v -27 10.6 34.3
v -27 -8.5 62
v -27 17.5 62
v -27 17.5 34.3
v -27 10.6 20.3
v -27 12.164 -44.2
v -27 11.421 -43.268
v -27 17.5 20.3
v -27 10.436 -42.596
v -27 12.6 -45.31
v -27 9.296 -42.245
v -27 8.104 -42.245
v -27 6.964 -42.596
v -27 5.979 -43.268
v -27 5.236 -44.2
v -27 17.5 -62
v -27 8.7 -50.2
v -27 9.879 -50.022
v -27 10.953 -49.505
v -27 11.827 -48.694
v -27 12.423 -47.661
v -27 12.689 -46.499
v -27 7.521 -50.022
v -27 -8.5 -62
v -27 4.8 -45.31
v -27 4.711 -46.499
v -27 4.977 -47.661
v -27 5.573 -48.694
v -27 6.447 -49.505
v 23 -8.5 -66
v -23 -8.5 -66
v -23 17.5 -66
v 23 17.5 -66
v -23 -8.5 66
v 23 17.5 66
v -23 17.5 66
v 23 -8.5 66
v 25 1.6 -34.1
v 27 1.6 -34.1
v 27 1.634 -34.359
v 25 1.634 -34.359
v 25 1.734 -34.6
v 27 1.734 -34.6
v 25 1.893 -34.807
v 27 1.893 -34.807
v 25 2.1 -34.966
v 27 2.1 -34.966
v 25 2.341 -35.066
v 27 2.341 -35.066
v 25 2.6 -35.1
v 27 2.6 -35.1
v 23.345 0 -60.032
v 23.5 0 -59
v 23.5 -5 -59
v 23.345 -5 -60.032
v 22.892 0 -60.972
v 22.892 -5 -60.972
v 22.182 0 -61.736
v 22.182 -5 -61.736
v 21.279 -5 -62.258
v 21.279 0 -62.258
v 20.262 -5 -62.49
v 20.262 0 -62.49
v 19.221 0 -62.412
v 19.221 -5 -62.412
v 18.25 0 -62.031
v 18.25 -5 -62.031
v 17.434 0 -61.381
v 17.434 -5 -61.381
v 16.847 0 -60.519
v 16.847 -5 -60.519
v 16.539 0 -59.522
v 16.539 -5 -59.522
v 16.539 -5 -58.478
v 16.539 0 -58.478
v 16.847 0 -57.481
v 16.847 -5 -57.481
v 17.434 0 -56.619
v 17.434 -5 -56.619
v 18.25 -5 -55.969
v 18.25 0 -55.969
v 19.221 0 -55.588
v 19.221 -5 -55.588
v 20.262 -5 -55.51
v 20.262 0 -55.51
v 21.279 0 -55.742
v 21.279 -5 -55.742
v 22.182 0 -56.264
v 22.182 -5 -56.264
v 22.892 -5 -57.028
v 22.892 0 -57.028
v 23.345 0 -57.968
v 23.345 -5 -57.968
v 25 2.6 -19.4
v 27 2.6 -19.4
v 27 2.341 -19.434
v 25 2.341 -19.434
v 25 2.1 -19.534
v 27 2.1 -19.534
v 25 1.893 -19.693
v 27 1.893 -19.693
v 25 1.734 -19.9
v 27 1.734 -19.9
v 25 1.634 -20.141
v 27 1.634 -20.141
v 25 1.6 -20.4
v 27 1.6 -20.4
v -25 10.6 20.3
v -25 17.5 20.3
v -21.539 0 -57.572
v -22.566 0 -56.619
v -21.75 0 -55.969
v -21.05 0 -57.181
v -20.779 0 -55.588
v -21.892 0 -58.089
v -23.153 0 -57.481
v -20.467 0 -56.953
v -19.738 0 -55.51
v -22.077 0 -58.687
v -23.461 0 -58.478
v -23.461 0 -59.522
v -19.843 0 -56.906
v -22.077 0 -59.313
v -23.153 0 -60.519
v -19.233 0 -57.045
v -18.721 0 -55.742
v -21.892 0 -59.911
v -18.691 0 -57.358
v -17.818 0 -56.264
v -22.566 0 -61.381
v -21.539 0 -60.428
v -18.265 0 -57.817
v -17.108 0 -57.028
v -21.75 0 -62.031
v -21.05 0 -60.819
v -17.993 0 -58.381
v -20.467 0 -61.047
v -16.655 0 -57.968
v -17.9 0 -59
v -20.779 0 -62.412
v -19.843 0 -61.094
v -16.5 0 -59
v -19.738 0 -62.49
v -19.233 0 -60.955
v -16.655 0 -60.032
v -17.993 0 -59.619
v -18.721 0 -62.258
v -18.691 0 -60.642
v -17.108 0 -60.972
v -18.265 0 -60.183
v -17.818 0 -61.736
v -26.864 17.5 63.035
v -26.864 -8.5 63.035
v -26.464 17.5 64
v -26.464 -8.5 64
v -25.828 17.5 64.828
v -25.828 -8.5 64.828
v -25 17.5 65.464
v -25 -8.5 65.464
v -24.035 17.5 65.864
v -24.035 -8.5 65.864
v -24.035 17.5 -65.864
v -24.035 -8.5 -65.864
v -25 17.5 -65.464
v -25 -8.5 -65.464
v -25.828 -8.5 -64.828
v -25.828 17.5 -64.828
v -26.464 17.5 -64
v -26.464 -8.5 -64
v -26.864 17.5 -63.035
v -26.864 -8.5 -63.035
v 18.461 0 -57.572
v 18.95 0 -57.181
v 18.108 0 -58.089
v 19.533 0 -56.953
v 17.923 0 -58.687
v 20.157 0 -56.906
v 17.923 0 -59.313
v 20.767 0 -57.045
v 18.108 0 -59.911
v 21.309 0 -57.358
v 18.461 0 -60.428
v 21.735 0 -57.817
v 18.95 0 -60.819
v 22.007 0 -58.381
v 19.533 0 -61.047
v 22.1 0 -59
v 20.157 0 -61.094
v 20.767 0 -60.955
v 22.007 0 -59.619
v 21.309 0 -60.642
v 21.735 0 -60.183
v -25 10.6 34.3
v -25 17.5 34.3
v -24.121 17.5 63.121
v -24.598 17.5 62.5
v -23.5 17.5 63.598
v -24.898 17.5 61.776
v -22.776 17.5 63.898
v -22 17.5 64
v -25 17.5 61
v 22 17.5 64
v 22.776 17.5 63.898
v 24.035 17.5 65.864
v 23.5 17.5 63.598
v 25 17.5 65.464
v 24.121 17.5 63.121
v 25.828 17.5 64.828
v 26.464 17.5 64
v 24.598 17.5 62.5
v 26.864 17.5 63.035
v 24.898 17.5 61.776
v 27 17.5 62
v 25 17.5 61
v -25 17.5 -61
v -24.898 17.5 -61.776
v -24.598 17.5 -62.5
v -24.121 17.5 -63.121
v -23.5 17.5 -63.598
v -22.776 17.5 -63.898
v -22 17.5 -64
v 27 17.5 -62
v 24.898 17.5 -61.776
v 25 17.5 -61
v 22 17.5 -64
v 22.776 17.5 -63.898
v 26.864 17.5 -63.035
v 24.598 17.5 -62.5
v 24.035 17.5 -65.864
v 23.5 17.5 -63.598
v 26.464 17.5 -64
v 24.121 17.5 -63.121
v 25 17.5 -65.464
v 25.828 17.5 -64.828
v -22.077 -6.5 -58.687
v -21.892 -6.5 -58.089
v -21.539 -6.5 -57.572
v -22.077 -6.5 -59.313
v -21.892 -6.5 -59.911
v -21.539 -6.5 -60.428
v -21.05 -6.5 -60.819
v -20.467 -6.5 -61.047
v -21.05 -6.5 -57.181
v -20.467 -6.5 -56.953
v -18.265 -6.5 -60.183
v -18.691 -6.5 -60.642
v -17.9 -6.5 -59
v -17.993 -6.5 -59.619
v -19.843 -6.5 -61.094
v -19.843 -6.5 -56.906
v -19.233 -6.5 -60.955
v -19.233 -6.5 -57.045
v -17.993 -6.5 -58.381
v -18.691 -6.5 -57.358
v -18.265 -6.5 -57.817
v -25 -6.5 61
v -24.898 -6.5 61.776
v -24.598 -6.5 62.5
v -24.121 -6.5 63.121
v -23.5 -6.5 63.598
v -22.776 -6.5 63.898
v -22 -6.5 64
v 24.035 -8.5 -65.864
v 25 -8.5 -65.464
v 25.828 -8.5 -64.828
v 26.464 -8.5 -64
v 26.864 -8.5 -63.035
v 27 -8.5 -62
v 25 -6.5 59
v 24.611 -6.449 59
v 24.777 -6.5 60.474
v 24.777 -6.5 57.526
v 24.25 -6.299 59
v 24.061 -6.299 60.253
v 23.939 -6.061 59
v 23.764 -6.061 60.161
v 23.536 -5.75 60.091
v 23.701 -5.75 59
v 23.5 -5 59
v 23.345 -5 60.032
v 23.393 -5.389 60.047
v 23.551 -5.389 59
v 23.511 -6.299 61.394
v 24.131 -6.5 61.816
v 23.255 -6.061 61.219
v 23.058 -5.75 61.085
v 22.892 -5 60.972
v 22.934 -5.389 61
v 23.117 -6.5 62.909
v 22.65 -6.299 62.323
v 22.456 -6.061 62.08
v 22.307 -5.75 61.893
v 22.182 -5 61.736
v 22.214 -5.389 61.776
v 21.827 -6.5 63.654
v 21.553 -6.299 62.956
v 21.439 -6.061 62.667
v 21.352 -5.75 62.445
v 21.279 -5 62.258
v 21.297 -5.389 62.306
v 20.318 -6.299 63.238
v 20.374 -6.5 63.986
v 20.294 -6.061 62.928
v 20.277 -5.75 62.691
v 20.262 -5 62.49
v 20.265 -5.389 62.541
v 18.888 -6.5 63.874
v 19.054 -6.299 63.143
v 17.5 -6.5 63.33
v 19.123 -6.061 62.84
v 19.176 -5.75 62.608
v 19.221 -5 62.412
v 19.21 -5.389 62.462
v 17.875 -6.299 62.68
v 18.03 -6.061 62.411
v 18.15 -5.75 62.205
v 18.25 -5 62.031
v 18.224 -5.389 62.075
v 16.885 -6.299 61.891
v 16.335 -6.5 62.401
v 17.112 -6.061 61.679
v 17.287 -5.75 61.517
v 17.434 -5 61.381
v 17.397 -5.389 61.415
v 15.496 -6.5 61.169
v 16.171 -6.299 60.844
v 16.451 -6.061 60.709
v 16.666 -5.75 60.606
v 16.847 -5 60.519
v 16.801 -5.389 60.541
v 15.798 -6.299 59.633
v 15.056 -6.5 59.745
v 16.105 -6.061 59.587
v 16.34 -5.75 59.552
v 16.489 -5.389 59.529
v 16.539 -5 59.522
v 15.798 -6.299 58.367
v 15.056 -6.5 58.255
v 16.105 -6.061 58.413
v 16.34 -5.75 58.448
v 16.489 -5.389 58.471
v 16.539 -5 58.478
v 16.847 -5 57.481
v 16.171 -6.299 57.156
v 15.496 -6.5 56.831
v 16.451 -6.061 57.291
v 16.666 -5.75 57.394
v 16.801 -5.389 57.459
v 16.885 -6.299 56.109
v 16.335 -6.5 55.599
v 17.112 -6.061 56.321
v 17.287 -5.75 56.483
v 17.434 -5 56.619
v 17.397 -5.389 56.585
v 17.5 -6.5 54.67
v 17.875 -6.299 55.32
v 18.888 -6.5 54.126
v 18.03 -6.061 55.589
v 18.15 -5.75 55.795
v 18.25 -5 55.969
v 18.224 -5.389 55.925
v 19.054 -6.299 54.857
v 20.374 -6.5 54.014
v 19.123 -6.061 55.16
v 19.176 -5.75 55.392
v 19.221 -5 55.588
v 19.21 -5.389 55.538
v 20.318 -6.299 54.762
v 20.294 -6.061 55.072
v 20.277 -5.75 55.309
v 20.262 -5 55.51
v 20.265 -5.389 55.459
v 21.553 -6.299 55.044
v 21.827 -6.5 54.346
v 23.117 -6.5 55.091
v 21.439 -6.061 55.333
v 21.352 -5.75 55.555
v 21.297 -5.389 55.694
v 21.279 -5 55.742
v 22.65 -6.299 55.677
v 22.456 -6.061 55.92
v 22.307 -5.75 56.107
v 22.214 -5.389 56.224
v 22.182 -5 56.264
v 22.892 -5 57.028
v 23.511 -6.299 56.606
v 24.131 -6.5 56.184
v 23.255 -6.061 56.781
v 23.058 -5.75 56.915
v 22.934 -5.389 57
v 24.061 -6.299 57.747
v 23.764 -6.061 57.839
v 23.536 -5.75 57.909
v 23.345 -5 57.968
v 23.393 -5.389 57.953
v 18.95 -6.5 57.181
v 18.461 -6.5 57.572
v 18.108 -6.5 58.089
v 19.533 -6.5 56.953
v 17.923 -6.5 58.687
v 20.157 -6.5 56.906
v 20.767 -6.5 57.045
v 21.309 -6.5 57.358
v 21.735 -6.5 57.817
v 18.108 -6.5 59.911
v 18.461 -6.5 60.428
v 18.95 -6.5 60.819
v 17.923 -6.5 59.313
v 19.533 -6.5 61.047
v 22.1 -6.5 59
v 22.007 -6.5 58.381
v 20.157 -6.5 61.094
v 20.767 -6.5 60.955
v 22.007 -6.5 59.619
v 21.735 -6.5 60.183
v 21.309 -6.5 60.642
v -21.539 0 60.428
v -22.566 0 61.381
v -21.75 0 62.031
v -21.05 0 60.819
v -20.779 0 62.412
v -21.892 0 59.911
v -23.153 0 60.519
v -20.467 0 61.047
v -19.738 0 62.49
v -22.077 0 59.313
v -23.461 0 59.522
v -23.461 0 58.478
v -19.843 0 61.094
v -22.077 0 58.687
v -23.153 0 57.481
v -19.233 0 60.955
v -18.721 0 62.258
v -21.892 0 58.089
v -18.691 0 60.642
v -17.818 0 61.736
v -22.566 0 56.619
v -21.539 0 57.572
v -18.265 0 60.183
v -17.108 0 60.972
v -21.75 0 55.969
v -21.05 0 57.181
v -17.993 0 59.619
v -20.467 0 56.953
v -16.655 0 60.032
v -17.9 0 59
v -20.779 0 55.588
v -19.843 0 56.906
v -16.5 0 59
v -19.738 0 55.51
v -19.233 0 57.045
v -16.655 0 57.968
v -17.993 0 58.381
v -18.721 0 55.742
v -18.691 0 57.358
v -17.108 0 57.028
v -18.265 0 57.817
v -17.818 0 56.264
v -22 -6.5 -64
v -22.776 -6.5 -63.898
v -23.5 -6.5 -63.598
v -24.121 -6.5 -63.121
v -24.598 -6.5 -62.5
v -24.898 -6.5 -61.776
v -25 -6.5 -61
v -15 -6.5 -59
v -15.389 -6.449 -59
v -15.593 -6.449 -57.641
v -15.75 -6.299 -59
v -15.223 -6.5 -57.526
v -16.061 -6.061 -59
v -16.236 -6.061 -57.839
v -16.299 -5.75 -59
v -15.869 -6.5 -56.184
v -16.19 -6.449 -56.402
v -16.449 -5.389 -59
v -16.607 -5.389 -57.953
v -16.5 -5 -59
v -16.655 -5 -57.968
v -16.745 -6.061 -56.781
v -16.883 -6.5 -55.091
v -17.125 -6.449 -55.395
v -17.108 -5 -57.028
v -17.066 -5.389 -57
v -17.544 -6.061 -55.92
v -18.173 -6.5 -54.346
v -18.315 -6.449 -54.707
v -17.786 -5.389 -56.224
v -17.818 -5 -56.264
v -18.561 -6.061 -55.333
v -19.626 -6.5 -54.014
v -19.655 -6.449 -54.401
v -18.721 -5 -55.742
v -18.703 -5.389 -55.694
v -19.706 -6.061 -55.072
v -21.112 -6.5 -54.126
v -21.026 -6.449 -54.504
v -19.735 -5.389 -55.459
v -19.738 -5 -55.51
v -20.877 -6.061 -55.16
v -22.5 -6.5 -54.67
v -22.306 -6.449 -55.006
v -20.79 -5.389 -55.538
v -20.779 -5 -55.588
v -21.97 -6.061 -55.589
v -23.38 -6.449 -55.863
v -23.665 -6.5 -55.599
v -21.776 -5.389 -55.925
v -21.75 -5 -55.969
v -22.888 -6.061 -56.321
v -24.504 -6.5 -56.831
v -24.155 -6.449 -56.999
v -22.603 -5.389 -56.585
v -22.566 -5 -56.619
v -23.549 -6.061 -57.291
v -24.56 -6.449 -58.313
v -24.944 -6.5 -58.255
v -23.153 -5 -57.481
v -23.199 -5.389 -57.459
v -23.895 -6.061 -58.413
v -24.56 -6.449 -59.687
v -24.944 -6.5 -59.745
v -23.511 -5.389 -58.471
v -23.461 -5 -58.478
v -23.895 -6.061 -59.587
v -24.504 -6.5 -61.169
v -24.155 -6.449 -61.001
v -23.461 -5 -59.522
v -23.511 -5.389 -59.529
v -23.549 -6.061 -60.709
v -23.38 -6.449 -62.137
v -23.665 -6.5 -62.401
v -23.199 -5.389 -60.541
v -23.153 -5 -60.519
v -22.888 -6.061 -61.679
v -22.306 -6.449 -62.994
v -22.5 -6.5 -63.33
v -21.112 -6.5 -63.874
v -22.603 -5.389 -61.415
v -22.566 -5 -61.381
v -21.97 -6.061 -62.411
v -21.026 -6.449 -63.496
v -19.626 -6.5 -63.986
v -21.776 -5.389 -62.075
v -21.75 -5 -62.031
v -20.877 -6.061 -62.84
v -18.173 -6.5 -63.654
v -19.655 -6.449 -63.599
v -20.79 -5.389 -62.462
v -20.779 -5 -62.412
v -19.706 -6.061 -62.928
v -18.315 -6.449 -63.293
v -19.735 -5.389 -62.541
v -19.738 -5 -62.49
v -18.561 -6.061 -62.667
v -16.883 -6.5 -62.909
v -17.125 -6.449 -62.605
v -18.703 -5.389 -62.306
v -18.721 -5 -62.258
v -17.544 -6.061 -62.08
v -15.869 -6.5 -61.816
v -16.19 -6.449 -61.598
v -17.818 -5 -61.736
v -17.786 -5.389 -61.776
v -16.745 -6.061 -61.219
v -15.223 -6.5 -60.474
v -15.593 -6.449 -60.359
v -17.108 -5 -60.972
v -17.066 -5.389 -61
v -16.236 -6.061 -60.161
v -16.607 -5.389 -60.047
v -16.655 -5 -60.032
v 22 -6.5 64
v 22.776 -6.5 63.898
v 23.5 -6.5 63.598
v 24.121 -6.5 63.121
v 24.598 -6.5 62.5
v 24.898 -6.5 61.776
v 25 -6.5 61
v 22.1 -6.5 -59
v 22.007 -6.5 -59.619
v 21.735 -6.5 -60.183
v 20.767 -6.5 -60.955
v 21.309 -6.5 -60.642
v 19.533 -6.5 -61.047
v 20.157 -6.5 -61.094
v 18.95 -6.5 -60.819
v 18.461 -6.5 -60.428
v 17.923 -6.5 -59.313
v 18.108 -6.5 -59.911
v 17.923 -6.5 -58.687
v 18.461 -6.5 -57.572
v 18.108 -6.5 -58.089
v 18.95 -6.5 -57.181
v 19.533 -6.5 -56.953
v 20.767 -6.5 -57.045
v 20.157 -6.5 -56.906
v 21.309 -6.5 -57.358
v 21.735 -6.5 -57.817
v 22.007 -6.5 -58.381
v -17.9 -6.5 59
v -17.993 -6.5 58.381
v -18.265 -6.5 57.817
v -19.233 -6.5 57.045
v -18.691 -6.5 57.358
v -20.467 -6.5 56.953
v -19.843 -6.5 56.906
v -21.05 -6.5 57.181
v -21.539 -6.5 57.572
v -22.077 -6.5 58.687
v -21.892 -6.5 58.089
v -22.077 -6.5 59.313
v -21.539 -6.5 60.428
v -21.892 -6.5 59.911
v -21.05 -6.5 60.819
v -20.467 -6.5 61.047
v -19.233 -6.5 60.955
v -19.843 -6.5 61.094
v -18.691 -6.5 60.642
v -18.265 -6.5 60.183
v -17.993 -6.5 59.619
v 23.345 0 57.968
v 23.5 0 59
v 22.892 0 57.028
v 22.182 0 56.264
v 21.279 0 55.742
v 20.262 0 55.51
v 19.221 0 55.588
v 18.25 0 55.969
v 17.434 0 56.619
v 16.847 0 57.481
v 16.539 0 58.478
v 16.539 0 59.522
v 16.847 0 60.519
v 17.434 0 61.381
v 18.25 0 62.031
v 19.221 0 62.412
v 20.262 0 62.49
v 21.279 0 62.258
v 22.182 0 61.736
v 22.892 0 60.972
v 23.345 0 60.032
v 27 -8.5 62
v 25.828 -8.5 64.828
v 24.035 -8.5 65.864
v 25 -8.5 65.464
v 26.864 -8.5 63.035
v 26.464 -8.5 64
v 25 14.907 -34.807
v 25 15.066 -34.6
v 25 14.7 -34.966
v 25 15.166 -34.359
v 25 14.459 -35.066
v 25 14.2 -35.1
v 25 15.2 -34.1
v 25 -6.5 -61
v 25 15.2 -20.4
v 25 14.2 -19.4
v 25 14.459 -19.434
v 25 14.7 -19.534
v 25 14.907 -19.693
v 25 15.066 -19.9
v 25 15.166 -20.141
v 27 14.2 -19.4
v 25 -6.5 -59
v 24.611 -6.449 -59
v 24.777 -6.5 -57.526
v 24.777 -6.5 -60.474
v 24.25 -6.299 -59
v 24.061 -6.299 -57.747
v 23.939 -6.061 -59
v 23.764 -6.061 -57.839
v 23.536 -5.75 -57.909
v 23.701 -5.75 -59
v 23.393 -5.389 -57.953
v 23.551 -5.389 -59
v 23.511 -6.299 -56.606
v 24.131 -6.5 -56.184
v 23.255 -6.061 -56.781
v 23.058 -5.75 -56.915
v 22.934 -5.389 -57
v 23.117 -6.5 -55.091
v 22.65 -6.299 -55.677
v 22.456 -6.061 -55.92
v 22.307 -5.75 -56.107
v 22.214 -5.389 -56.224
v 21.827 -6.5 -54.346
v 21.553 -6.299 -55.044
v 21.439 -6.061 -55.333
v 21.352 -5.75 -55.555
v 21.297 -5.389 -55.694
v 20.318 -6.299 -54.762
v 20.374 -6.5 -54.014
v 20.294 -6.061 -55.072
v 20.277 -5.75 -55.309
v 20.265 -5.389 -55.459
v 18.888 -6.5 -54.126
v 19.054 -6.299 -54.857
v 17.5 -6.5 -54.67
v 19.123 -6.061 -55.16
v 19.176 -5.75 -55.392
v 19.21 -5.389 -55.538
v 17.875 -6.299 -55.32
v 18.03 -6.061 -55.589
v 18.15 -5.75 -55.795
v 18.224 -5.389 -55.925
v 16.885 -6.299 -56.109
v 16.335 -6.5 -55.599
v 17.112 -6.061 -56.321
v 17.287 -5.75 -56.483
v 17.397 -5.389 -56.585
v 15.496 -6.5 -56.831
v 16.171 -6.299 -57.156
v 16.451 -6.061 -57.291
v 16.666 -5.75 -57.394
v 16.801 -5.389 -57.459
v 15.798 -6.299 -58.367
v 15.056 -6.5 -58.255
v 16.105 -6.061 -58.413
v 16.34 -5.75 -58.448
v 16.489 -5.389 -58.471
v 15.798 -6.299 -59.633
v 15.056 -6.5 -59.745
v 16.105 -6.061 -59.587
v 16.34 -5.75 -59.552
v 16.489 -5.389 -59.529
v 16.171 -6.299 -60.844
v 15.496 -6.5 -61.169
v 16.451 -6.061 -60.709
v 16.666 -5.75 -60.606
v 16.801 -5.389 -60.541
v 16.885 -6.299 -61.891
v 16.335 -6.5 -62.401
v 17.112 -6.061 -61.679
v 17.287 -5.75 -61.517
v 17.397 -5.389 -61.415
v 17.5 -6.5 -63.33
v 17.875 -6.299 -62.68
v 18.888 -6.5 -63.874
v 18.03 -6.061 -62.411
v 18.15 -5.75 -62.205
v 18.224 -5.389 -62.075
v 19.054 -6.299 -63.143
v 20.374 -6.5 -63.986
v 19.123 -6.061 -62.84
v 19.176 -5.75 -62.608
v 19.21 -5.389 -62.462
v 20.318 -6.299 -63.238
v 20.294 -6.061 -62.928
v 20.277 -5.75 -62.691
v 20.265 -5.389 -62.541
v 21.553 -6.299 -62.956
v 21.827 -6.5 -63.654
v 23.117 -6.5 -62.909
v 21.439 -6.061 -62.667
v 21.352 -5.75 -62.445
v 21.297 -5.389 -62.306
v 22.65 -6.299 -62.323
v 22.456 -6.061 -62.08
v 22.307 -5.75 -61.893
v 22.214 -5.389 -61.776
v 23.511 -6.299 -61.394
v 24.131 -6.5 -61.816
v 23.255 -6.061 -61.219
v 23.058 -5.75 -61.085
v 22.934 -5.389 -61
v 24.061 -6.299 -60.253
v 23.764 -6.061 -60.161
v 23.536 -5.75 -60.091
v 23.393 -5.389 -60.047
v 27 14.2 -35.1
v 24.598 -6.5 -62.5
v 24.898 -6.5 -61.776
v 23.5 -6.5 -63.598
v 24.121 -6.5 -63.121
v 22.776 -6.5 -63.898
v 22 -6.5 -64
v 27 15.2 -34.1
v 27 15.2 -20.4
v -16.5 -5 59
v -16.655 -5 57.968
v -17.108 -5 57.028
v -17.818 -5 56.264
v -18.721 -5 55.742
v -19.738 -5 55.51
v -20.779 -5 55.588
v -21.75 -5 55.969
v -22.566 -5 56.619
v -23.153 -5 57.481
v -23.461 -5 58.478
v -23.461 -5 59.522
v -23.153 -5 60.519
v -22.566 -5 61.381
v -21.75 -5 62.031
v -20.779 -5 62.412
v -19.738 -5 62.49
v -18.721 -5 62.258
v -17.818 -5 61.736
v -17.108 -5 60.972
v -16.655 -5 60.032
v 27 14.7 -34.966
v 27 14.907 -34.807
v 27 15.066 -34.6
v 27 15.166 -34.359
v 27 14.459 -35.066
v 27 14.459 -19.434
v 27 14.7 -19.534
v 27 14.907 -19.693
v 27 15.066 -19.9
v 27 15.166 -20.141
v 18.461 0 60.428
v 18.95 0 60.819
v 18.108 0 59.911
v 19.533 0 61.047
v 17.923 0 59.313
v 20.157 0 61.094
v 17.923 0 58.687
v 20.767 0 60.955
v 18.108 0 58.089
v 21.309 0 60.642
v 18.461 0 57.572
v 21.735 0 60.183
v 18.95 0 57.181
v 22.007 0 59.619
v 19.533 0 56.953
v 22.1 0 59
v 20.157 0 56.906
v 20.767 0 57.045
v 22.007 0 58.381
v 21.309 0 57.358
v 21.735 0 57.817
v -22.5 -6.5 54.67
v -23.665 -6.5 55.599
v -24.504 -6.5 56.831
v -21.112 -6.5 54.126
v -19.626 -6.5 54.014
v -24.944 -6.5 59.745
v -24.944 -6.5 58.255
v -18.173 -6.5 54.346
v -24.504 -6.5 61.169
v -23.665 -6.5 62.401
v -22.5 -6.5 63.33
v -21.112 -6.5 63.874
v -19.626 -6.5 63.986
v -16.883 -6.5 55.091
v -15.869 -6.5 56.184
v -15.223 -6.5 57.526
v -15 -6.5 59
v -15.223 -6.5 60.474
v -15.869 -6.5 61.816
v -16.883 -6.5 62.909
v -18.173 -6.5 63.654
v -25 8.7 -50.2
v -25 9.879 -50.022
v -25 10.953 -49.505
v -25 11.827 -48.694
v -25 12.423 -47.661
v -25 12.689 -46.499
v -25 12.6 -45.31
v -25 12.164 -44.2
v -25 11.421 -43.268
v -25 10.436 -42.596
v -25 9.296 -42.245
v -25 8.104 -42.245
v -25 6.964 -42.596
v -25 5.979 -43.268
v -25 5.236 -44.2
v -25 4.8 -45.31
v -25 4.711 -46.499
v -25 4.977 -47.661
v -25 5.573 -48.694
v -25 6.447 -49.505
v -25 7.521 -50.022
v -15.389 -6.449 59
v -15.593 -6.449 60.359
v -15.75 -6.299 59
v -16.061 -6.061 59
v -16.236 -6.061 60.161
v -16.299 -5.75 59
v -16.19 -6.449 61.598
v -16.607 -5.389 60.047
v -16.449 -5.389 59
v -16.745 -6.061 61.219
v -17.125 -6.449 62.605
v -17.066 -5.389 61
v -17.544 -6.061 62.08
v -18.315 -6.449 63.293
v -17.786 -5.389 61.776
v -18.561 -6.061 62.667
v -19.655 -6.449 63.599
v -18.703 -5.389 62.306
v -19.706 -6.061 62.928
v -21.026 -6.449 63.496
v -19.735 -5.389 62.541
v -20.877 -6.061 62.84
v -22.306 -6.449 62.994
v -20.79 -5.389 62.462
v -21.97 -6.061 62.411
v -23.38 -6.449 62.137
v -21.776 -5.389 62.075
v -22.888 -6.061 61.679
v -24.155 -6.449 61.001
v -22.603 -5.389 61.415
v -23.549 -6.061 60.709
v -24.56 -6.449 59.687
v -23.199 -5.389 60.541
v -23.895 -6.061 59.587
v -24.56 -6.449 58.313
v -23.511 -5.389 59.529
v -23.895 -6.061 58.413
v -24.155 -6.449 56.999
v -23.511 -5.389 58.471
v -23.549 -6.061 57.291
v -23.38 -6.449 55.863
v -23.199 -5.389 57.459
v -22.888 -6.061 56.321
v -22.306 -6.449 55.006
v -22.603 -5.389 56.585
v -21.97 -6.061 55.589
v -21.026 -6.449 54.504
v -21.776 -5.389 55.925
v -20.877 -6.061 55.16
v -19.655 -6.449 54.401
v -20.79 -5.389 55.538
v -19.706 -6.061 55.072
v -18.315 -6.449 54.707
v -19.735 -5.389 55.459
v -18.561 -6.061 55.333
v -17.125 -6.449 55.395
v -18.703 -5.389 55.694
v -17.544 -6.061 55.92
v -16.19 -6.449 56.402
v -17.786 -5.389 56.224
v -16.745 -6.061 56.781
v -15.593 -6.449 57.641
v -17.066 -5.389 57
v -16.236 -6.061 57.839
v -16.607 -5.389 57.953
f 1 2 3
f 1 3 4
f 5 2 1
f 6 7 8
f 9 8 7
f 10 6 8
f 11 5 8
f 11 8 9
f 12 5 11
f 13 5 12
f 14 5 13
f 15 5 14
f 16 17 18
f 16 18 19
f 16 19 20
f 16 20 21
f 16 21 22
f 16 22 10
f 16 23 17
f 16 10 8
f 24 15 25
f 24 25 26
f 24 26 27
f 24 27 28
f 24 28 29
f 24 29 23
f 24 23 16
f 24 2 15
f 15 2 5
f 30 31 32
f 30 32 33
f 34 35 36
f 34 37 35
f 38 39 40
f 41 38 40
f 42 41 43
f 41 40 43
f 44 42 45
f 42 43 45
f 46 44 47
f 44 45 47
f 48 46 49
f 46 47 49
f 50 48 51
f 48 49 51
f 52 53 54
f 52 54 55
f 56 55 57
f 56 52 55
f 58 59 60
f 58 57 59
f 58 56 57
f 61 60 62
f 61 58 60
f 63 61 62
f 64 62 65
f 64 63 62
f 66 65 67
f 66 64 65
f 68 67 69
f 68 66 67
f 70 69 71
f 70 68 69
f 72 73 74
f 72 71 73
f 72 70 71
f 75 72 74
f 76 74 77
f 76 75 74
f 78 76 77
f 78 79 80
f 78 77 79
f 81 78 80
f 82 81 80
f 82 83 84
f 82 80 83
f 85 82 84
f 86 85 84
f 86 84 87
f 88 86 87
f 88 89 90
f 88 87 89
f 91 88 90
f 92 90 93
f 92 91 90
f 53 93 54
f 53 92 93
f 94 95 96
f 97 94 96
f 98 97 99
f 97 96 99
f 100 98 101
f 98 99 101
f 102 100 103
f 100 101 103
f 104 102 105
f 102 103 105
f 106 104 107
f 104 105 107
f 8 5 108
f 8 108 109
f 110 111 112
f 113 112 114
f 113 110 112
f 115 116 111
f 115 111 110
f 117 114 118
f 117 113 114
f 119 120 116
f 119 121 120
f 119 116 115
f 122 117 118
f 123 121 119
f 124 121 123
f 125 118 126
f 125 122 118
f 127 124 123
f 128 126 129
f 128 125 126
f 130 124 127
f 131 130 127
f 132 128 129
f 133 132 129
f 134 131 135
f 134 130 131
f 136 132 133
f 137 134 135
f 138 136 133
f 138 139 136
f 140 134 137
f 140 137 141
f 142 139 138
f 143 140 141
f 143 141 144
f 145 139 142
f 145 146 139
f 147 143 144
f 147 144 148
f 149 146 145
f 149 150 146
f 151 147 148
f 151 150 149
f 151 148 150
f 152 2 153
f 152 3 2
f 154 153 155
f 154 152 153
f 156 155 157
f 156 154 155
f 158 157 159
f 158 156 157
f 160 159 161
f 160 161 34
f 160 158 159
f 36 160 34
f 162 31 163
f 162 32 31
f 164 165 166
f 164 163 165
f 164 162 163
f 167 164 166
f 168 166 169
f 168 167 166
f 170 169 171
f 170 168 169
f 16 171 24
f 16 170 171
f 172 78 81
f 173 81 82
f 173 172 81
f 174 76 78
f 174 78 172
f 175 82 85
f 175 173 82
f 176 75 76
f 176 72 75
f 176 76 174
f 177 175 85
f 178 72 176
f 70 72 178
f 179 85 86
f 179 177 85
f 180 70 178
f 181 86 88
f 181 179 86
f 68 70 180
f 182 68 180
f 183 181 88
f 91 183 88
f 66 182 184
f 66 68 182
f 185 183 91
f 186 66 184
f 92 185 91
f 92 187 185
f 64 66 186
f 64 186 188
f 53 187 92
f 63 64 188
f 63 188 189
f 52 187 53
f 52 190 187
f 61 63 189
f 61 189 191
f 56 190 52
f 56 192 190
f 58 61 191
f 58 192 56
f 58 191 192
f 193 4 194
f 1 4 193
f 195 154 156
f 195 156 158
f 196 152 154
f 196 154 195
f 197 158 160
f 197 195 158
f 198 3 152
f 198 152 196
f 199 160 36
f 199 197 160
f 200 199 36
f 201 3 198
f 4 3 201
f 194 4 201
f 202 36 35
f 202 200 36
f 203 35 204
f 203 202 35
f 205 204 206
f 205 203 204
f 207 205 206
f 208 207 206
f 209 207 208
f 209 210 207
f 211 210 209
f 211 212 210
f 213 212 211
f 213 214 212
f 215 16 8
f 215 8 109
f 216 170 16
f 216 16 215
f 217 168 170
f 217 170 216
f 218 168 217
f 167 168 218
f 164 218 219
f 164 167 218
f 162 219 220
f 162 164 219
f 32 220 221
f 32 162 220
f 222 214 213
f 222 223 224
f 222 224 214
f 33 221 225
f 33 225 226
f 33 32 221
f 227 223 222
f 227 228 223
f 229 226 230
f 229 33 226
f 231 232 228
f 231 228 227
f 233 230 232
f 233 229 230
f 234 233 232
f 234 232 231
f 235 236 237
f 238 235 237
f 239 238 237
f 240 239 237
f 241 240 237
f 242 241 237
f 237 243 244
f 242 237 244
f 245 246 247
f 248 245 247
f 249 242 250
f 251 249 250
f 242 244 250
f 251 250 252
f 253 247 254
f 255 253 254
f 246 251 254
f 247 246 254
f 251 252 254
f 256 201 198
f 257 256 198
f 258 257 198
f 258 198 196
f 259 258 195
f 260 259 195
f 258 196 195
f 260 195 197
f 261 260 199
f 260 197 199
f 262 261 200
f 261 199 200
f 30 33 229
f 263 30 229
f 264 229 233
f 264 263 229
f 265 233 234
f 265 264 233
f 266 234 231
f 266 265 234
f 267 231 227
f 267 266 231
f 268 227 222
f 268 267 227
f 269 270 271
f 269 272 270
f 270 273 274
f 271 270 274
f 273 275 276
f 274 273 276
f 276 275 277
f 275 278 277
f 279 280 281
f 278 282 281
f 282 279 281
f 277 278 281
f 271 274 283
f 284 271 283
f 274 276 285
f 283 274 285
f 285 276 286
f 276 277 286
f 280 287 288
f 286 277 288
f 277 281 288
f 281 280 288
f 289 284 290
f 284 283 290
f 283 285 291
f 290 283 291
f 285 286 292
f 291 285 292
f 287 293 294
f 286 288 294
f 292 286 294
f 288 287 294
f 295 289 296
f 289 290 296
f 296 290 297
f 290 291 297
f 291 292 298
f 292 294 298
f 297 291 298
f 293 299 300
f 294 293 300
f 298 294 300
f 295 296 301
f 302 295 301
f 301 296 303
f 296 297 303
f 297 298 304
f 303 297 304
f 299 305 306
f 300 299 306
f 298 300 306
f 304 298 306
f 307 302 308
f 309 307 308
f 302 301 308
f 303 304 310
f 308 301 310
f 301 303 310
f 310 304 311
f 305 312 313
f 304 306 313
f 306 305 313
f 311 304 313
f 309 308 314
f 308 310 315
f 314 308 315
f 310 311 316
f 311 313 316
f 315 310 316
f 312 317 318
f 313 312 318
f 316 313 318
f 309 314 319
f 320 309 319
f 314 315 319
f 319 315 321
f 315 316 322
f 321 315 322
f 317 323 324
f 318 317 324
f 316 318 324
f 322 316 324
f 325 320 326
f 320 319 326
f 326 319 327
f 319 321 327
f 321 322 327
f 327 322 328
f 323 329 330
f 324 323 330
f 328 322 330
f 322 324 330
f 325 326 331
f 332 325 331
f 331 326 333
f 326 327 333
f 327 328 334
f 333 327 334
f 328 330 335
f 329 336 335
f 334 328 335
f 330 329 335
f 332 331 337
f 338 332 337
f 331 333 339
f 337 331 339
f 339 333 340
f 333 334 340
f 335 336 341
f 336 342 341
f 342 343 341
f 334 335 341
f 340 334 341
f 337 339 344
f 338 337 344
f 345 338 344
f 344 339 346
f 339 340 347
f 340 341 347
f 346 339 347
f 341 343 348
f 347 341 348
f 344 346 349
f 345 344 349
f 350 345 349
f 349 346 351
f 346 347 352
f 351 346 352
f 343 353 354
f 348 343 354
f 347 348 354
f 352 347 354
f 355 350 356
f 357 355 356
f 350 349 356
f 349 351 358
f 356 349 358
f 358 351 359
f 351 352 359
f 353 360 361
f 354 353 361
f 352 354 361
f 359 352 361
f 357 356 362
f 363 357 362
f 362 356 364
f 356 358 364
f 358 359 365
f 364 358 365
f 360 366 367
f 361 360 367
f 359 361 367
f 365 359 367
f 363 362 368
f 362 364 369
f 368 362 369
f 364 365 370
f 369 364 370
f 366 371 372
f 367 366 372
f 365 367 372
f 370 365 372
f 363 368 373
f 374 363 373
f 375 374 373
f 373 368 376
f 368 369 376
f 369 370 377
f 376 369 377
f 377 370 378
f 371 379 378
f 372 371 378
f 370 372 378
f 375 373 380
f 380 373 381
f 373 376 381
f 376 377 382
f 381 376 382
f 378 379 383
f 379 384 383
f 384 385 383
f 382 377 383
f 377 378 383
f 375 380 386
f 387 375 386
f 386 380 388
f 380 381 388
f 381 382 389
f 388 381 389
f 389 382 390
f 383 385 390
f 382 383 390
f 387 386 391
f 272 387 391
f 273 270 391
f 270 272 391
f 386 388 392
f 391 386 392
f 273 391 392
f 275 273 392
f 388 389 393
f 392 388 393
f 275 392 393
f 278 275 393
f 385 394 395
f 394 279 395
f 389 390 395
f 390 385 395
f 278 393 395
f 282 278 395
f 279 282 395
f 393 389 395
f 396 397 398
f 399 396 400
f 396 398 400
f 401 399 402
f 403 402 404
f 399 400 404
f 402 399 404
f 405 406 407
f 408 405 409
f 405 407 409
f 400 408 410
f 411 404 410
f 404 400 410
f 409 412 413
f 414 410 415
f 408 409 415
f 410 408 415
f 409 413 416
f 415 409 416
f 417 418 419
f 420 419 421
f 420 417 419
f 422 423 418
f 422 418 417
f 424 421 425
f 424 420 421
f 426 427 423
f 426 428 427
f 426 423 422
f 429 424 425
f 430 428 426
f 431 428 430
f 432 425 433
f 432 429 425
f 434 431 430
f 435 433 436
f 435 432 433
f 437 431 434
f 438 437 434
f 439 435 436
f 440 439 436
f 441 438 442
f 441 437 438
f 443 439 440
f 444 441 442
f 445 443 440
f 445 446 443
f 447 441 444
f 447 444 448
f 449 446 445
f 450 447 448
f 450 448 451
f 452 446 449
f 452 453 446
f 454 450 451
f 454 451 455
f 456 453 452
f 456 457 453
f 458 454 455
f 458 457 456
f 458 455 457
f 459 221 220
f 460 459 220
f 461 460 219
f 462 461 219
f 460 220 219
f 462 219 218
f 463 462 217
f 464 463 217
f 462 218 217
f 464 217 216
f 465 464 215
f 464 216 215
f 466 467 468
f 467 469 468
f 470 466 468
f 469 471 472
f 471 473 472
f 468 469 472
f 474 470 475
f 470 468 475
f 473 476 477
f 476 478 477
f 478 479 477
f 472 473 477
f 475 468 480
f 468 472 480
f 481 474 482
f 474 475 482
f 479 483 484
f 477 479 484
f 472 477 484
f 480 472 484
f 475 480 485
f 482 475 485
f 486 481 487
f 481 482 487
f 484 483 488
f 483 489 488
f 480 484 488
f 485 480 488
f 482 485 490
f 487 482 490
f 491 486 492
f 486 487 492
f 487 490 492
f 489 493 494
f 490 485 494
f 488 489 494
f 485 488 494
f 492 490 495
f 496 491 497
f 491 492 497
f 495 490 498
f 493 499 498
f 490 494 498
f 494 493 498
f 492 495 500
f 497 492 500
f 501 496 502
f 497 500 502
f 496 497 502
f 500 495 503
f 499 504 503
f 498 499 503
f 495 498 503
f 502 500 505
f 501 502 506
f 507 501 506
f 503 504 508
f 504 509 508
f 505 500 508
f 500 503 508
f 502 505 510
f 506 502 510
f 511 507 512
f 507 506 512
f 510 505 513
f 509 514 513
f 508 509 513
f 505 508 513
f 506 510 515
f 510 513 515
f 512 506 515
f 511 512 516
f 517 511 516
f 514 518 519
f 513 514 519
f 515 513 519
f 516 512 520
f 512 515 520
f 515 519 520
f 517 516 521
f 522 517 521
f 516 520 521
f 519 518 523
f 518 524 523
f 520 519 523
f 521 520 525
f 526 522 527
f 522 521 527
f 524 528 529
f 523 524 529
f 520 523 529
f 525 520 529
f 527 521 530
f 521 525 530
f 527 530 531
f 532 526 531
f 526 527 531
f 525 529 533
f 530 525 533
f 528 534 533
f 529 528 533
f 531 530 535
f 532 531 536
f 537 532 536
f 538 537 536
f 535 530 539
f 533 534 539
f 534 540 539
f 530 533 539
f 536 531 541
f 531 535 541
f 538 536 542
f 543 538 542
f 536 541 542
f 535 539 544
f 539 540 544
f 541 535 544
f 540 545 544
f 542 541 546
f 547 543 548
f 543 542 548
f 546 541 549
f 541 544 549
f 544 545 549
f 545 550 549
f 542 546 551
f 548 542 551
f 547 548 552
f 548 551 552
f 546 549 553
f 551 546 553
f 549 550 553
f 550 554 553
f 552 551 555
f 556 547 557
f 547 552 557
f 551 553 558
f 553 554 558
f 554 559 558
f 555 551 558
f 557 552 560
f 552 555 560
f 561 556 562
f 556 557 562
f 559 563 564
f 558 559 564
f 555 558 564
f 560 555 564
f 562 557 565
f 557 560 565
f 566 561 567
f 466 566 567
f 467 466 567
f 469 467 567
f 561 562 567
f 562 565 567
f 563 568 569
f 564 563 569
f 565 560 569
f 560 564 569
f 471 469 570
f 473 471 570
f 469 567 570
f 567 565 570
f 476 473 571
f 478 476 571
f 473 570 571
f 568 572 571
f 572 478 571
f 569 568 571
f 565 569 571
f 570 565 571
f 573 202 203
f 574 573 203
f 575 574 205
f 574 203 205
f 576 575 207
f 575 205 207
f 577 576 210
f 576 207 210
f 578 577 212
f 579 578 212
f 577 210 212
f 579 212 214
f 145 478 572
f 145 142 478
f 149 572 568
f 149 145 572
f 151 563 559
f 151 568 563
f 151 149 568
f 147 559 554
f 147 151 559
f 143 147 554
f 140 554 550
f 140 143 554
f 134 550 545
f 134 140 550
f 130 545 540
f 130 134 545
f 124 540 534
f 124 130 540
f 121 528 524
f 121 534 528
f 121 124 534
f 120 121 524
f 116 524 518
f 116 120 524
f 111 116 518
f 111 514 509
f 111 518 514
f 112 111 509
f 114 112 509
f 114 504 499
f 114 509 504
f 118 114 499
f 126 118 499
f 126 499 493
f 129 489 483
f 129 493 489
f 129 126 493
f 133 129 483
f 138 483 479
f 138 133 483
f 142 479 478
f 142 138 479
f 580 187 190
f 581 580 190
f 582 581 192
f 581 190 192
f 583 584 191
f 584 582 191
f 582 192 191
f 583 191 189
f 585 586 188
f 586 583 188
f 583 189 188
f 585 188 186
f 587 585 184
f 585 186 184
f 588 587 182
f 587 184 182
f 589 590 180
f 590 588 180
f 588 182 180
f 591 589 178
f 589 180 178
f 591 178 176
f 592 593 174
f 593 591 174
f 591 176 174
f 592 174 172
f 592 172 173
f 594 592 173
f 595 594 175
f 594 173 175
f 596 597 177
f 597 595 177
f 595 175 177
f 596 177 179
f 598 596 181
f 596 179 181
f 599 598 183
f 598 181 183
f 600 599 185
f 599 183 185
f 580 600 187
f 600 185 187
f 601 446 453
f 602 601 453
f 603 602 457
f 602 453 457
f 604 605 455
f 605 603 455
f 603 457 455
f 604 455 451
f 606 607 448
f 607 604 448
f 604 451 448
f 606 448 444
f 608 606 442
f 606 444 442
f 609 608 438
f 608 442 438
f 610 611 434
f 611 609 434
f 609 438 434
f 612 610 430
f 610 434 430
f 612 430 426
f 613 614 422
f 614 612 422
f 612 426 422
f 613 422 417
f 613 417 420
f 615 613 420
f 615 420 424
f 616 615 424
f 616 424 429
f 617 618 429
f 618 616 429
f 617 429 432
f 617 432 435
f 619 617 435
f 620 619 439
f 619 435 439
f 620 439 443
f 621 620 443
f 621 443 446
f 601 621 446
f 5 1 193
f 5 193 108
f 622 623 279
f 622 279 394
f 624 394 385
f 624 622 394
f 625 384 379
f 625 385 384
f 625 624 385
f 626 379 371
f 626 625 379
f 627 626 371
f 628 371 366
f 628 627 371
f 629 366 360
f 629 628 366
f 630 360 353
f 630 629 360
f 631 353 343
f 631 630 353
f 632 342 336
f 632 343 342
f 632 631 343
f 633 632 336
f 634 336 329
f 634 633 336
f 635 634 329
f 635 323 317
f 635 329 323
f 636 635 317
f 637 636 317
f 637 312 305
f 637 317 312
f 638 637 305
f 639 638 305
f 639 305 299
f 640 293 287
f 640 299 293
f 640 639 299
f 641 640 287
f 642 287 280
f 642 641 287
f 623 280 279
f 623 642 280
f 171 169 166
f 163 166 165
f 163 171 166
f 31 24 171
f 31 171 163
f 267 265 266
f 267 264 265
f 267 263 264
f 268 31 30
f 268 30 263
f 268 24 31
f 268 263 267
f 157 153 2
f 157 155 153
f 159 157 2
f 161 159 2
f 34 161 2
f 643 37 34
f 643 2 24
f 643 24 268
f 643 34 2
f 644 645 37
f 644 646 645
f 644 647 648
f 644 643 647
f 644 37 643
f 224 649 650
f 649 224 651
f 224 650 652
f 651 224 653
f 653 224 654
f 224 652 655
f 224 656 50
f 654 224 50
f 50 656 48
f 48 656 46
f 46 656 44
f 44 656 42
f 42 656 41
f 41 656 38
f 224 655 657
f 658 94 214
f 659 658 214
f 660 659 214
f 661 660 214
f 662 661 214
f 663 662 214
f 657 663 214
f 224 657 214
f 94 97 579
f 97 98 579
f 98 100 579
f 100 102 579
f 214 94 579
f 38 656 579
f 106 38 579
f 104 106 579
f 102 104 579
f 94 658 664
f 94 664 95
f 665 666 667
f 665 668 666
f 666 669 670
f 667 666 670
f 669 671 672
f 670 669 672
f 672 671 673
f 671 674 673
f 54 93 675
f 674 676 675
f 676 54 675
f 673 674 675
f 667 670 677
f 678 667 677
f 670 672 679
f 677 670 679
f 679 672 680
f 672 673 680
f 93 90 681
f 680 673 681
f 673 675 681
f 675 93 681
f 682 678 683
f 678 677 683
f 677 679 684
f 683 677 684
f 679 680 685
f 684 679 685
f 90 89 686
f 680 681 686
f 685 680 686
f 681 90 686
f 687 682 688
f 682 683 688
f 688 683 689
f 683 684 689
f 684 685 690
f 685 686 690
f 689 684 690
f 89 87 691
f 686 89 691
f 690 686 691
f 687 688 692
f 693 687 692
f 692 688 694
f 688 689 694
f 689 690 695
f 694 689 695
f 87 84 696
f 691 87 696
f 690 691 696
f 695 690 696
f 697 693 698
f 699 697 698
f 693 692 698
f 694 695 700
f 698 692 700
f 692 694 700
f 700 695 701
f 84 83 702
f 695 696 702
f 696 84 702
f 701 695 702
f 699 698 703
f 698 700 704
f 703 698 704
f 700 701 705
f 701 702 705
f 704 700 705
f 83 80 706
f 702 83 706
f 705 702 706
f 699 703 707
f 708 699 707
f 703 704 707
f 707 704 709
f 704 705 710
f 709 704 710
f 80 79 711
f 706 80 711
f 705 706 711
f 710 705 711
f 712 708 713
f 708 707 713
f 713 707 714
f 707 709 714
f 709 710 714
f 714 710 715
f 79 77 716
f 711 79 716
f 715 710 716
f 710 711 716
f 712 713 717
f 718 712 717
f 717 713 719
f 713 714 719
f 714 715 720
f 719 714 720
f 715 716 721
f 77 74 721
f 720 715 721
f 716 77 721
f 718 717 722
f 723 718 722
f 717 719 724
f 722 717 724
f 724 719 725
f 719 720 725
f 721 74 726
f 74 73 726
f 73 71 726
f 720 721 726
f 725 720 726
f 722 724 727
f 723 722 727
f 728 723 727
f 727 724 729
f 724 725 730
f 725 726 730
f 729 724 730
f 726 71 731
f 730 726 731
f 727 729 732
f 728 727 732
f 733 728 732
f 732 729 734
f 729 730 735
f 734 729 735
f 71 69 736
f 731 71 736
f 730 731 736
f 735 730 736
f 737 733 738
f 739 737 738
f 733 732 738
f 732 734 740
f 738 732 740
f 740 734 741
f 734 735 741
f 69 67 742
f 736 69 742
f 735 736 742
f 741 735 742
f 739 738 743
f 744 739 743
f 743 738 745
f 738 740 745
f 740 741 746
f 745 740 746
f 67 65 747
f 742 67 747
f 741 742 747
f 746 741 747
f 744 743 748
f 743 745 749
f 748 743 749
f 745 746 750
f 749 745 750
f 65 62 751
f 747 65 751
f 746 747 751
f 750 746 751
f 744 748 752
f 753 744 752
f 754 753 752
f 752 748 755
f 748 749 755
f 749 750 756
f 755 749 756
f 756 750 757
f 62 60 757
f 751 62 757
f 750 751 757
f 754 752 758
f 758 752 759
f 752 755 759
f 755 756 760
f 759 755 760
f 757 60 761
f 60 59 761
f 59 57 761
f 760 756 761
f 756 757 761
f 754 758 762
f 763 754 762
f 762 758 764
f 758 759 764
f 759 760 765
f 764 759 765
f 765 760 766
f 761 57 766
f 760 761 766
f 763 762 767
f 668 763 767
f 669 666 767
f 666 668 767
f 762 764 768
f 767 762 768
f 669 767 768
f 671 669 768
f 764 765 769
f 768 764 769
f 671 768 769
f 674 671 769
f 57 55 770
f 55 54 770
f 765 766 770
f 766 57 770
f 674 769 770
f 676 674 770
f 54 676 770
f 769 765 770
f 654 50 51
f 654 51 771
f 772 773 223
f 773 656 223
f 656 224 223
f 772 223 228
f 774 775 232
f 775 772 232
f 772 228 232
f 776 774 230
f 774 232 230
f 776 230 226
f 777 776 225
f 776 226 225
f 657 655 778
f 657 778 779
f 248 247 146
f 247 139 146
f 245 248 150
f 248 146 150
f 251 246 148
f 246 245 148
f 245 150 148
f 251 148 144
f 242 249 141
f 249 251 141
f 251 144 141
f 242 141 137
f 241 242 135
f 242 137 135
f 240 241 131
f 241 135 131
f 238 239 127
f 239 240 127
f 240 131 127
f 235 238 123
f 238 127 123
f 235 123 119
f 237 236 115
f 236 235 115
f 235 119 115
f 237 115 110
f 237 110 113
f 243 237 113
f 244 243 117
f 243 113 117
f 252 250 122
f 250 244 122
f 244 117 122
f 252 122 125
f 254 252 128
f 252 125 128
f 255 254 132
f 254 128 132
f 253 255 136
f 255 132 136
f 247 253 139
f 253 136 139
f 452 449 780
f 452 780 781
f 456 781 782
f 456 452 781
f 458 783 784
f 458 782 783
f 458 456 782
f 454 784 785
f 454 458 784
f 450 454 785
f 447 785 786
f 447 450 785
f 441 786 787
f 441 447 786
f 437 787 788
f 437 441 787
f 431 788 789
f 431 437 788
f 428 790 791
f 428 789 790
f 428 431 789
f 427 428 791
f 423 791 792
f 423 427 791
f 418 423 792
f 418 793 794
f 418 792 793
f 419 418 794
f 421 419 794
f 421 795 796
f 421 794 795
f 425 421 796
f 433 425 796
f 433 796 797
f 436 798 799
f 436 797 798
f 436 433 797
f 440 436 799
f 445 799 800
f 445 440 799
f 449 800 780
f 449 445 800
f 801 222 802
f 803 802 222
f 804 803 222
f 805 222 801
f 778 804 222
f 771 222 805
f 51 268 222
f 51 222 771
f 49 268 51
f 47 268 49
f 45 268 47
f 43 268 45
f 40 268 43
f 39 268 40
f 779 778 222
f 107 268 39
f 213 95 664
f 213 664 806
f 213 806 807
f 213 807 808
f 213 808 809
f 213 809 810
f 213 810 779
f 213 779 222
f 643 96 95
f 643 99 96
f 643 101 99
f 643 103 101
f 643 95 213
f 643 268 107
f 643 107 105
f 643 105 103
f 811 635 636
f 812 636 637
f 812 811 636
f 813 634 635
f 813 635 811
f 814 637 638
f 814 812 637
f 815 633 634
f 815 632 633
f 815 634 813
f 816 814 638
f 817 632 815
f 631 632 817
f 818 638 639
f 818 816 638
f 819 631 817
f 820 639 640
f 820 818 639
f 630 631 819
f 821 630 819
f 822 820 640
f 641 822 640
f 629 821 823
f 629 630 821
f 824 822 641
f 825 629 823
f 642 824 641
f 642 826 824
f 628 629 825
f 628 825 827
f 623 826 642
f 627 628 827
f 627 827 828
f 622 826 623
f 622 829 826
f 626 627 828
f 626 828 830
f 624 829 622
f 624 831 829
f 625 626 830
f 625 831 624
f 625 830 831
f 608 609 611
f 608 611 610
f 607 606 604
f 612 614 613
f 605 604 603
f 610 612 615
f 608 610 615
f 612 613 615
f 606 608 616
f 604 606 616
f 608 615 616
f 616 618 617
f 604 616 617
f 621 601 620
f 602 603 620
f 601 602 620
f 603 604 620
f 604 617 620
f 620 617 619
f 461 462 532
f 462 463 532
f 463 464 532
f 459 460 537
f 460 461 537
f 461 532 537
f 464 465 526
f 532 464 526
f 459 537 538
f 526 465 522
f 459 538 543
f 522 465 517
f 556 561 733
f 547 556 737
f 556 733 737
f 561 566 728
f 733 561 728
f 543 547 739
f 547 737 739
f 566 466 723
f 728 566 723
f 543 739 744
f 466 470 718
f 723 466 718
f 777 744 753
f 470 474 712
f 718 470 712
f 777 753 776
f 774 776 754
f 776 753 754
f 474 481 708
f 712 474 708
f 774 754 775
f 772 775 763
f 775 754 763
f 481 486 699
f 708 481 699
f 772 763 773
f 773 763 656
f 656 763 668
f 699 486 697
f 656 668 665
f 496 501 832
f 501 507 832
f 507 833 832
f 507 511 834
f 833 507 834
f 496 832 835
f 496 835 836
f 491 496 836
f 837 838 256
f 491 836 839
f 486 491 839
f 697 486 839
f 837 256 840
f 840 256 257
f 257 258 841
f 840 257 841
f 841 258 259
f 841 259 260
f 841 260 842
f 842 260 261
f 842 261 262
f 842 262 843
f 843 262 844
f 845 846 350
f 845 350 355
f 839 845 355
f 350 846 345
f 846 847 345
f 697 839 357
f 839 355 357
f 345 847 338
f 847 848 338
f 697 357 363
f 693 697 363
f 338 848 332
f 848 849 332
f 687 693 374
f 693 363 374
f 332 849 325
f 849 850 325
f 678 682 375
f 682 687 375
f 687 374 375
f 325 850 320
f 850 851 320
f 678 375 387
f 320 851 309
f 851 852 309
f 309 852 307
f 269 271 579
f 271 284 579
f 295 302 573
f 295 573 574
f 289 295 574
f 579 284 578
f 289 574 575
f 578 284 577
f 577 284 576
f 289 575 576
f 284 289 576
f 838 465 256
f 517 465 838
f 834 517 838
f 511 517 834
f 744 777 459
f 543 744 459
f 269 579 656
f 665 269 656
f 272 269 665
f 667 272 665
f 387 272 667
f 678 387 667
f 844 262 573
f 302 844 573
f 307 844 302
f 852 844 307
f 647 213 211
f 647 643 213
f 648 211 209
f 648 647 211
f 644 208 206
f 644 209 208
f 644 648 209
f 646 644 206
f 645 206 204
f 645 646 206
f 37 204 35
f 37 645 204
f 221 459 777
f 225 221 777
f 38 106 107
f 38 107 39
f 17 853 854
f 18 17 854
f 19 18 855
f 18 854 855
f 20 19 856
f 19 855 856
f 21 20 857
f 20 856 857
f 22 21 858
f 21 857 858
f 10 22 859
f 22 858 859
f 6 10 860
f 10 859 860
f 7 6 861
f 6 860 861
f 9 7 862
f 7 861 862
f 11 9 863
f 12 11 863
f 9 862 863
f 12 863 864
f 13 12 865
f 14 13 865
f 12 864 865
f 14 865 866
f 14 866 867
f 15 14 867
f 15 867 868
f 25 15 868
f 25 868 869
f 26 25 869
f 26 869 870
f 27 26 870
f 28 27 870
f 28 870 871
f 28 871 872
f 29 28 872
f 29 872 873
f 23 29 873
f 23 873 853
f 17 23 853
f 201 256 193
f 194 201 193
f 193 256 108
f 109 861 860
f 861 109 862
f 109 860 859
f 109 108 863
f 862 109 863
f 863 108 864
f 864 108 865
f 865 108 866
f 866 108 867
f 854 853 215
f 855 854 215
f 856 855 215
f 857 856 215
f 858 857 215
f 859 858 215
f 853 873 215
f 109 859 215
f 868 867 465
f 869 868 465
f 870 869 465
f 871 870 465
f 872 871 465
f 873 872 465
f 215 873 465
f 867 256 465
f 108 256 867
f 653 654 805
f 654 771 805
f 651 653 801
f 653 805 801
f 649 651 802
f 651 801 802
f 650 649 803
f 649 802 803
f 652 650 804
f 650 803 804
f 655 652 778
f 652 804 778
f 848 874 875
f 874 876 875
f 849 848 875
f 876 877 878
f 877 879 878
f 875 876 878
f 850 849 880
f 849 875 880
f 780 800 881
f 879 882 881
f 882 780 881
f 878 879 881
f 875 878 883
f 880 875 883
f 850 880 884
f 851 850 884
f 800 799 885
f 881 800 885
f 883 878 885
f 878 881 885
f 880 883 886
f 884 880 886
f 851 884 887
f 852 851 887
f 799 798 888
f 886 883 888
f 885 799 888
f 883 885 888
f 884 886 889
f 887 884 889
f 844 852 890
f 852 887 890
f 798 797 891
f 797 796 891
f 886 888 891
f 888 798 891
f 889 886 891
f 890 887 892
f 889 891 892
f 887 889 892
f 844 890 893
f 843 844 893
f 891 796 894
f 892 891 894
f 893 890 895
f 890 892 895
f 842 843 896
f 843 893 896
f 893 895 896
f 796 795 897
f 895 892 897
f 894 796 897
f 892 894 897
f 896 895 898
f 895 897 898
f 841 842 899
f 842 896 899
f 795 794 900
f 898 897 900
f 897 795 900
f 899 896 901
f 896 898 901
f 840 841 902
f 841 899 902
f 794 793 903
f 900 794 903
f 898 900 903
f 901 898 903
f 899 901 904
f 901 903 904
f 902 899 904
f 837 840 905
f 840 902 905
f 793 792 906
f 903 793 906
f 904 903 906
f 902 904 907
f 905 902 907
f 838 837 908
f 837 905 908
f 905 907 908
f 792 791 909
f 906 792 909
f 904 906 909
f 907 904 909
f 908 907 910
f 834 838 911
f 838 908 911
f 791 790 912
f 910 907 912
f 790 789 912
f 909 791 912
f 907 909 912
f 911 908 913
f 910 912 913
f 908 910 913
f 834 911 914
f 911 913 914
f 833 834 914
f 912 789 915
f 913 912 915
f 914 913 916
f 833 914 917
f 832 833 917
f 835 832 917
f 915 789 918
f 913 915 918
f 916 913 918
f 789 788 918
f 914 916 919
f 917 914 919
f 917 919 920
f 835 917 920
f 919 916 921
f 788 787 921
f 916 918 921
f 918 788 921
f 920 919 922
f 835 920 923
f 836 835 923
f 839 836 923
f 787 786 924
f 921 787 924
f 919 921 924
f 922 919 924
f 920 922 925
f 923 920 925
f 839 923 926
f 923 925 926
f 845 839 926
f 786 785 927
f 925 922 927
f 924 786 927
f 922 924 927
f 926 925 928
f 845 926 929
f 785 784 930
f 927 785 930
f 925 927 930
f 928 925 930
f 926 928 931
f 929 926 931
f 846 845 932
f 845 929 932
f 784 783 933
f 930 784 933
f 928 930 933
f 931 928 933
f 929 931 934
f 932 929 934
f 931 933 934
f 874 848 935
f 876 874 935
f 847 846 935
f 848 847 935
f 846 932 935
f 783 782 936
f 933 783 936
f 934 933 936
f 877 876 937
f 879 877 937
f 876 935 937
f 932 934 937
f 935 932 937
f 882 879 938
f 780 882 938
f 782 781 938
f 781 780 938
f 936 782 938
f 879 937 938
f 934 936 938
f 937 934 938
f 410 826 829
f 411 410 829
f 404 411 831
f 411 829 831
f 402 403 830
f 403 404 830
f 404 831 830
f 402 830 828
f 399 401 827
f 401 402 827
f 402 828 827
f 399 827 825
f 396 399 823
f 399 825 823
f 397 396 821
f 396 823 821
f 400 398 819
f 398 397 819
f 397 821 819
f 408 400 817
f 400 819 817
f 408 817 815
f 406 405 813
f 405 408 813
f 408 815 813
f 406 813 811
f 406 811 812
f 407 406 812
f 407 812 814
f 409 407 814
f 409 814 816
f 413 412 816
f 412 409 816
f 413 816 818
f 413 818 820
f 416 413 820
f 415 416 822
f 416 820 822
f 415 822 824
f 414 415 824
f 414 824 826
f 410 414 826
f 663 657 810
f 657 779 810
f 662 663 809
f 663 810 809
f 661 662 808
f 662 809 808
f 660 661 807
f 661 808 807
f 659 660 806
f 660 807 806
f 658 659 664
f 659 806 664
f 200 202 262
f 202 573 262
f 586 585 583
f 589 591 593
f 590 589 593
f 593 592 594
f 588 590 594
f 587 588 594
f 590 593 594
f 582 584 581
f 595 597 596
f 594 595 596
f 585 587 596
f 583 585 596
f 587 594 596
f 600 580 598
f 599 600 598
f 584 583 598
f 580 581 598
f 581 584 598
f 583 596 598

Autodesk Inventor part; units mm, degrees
ref_plane "YZ Plane" through (0, 0, 0) normal (1, 0, 0) x (0, 1, 0)
ref_plane "XZ Plane" through (0, 0, 0) normal (0, 1, 0) x (-1, 0, 0)
ref_plane "XY Plane" through (0, 0, 0) normal (0, 0, 1) x (1, 0, 0)
sketch "Sketch1" plane through (0, 0, 0) normal (0, 1, 0) x (-1, 0, 0)
  line L0 (-24, 63) -> (24, 63)
  line L1 (24, 63) -> (24, -63)
  line L2 (24, -63) -> (-24, -63)
  line L3 (-24, -63) -> (-24, 63)
  line L4 (-24, 63) -> (24, -63) construction
  line L5 (24, 63) -> (-24, -63) construction
  line L6 (-20, 59) -> (20, 59) construction
  line L7 (20, 59) -> (20, -59) construction
  line L8 (20, -59) -> (-20, -59) construction
  line L9 (-20, -59) -> (-20, 59) construction
  line L10 (-20, 59) -> (20, -59) construction
  line L11 (20, 59) -> (-20, -59) construction
  circle A0 centre (20, 59) radius 1.55
  circle A1 centre (20, -59) radius 1.55
  circle A2 centre (-20, -59) radius 1.55
  circle A3 centre (-20, 59) radius 1.55
  point P0 (0, 0)
  dimension "d0" = 126
  dimension "d1" = 48
  dimension "d2" = 3.1
  dimension "d3" = 4
  dimension "d4" = 4
  dimension "d5" = 3.1
  dimension "d6" = 3.1
  dimension "d7" = 3.1
extrude "Extrusion1" add sketch "Sketch1" along normal blind 1.6
fillet "Fillet1" radius 5 4 edges at (24, 0.8, -63) (-24, 0.8, -63) (24, 0.8, 63) (-24, 0.8, 63)
sketch "Sketch2" plane through (0, 0, 0) normal (0, -1, 0) x (1, 0, 0)
  circle A0 centre (20, 59) radius 1.55 projected
  circle A1 centre (20, 59) radius 2.1
  circle A2 centre (20, 59) radius 3.5
  line L0 (0, 0) -> (23.8307, 0) construction
  line L1 (0, 0) -> (0, 62.8307) construction
  circle A3 centre (20, -59) radius 1.55
  circle A4 centre (20, -59) radius 2.1
  circle A5 centre (20, -59) radius 3.5
  circle A6 centre (-20, 59) radius 1.55
  circle A7 centre (-20, 59) radius 2.1
  circle A8 centre (-20, 59) radius 3.5
  circle A9 centre (-20, -59) radius 1.55
  circle A10 centre (-20, -59) radius 2.1
  circle A11 centre (-20, -59) radius 3.5
  point P0 (-23.8307, 0)
  dimension "d11" = 4.2
  dimension "d12" = 7
extrude "Extrusion2" add sketch "Sketch2" along normal blind 6.5 contours A2 | A5 | A8 | A11
sketch "Sketch3" plane through (20, -6.5, -59) normal (0, -1, 0) x (1, 0, 0)
  line L0 (-47, 125) -> (7, 125)
  line L1 (7, 125) -> (7, -7)
  line L2 (7, -7) -> (-47, -7)
  line L3 (-47, -7) -> (-47, 125)
  line L4 (-47, 125) -> (7, -7) construction
  line L5 (7, 125) -> (-47, -7) construction
  line L6 (4, 117) -> (4, 1) projected
  line L7 (-39, 122) -> (-1, 122) projected
  point P0 (-20, 59)
  dimension "d17" = 3
  dimension "d18" = 3
extrude "Extrusion3" add sketch "Sketch3" along normal blind 2
sketch "Sketch4" plane through (20, -6.5, -59) normal (0, 1, 0) x (1, 0, 0)
  line L0 (-47, 7) -> (7, 7) projected
  line L1 (7, -125) -> (-47, -125)
  line L2 (-47, -125) -> (-47, 7)
  line L3 (-47, 7) -> (7, 7)
  line L4 (7, 7) -> (7, -125)
  line L5 (7, -125) -> (-47, 7) construction
  line L6 (-47, -125) -> (7, 7) construction
  line L7 (5, -123) -> (-45, -123)
  line L8 (-45, -123) -> (-45, 5)
  line L9 (-45, 5) -> (5, 5)
  line L10 (5, 5) -> (5, -123)
  line L11 (5, -123) -> (-45, 5) construction
  line L12 (-45, -123) -> (5, 5) construction
  point P0 (-20, -59)
  dimension "d21" = 2
  dimension "d22" = 2
extrude "Extrusion4" add sketch "Sketch4" along normal blind 24
sketch "Sketch5" plane through (-25, -6.5, 64) normal (1, 0, 0) x (0, 0, -1)
  circle A0 centre (110.2, 15.2) radius 4
  line L0 (6, 6.5) -> (122, 6.5) projected
  point P0 (64, 6.5)
  point P1 (1, 8.1)
  point P2 (127, 8.1)
  point P3 (108.5902, 6.5)
  point P4 (111.8098, 6.5)
  dimension "d25" = 8.7
  dimension "d27" = 16.8
  dimension "d28" = 8
extrude "Extrusion5" cut sketch "Sketch5" against normal blind 15.5
sketch "Sketch6" plane through (25, -6.5, -64) normal (-1, 0, 0) x (0, 0, 1)
  line L0 (28.9, 21.7) -> (44.6, 21.7)
  line L1 (44.6, 21.7) -> (44.6, 8.1)
  line L2 (44.6, 8.1) -> (28.9, 8.1)
  line L3 (28.9, 8.1) -> (28.9, 21.7)
  line L4 (122, 8.1) -> (6, 8.1) projected
  point P0 (64, 6.5)
  point P1 (1, 8.1)
  dimension "d31" = 43.6
  dimension "d32" = 15.7
  dimension "d33" = 13.6
extrude "Extrusion6" cut sketch "Sketch6" against normal blind 15.5
fillet "Fillet2" radius 1 4 edges at (26, 1.6, -35.1) (26, 1.6, -19.4) (26, 15.2, -19.4) (26, 15.2, -35.1)
sketch "Sketch7" plane through (-27, -8.5, -66) normal (-1, 0, 0) x (0, 0, 1)
  line L0 (86.3, 29.1) -> (100.3, 29.1)
  line L1 (100.3, 29.1) -> (100.3, 19.1)
  line L2 (100.3, 19.1) -> (86.3, 19.1)
  line L3 (86.3, 19.1) -> (86.3, 29.1)
  line L4 (86.3, 29.1) -> (100.3, 19.1) construction
  line L5 (100.3, 29.1) -> (86.3, 19.1) construction
  line L6 (8, 10.1) -> (124, 10.1) projected
  point P0 (66, 8.5)
  point P1 (93.3, 24.1)
  point P2 (129, 10.1)
  dimension "d37" = 14
  dimension "d38" = 10
  dimension "d39" = 35.7
  dimension "d40" = 14
extrude "Extrusion7" cut sketch "Sketch7" against normal blind 15.5
sketch "Sketch8" plane through (0, 1.6, 0) normal (0, 1, 0) x (1, 0, 0)
  line L0 (-24, 63) -> (24, 63)
  line L1 (24, 63) -> (24, -63)
  line L2 (24, -63) -> (-24, -63)
  line L3 (-24, -63) -> (-24, 63)
  line L4 (-24, 63) -> (24, -63) construction
  line L5 (24, 63) -> (-24, -63) construction
  line L6 (24, -58) -> (24, 58) projected
  line L7 (19, 63) -> (-19, 63) projected
  point P0 (0, 0)
extrude "Extrusion8" cut sketch "Sketch8" against normal blind 1.6
fillet "Fillet3" radius 1.5 4 edges at (-23.5, -6.5, -59) (16.5, -6.5, -59) (16.5, -6.5, 59) (-23.5, -6.5, 59)
fillet "Fillet4" radius 3 4 edges at (25, 5.5, -64) (25, 5.5, 64) (-25, 5.5, 64) (-25, 5.5, -64)
fillet "Fillet5" radius 4 4 edges at (-27, 4.5, 66) (-27, 4.5, -66) (27, 4.5, -66) (27, 4.5, 66)
equation "\"d5\" = d2"
equation "\"d6\" = d2"
equation "\"d7\" = d2"
properties part number "Control_PCB_enclosure"
